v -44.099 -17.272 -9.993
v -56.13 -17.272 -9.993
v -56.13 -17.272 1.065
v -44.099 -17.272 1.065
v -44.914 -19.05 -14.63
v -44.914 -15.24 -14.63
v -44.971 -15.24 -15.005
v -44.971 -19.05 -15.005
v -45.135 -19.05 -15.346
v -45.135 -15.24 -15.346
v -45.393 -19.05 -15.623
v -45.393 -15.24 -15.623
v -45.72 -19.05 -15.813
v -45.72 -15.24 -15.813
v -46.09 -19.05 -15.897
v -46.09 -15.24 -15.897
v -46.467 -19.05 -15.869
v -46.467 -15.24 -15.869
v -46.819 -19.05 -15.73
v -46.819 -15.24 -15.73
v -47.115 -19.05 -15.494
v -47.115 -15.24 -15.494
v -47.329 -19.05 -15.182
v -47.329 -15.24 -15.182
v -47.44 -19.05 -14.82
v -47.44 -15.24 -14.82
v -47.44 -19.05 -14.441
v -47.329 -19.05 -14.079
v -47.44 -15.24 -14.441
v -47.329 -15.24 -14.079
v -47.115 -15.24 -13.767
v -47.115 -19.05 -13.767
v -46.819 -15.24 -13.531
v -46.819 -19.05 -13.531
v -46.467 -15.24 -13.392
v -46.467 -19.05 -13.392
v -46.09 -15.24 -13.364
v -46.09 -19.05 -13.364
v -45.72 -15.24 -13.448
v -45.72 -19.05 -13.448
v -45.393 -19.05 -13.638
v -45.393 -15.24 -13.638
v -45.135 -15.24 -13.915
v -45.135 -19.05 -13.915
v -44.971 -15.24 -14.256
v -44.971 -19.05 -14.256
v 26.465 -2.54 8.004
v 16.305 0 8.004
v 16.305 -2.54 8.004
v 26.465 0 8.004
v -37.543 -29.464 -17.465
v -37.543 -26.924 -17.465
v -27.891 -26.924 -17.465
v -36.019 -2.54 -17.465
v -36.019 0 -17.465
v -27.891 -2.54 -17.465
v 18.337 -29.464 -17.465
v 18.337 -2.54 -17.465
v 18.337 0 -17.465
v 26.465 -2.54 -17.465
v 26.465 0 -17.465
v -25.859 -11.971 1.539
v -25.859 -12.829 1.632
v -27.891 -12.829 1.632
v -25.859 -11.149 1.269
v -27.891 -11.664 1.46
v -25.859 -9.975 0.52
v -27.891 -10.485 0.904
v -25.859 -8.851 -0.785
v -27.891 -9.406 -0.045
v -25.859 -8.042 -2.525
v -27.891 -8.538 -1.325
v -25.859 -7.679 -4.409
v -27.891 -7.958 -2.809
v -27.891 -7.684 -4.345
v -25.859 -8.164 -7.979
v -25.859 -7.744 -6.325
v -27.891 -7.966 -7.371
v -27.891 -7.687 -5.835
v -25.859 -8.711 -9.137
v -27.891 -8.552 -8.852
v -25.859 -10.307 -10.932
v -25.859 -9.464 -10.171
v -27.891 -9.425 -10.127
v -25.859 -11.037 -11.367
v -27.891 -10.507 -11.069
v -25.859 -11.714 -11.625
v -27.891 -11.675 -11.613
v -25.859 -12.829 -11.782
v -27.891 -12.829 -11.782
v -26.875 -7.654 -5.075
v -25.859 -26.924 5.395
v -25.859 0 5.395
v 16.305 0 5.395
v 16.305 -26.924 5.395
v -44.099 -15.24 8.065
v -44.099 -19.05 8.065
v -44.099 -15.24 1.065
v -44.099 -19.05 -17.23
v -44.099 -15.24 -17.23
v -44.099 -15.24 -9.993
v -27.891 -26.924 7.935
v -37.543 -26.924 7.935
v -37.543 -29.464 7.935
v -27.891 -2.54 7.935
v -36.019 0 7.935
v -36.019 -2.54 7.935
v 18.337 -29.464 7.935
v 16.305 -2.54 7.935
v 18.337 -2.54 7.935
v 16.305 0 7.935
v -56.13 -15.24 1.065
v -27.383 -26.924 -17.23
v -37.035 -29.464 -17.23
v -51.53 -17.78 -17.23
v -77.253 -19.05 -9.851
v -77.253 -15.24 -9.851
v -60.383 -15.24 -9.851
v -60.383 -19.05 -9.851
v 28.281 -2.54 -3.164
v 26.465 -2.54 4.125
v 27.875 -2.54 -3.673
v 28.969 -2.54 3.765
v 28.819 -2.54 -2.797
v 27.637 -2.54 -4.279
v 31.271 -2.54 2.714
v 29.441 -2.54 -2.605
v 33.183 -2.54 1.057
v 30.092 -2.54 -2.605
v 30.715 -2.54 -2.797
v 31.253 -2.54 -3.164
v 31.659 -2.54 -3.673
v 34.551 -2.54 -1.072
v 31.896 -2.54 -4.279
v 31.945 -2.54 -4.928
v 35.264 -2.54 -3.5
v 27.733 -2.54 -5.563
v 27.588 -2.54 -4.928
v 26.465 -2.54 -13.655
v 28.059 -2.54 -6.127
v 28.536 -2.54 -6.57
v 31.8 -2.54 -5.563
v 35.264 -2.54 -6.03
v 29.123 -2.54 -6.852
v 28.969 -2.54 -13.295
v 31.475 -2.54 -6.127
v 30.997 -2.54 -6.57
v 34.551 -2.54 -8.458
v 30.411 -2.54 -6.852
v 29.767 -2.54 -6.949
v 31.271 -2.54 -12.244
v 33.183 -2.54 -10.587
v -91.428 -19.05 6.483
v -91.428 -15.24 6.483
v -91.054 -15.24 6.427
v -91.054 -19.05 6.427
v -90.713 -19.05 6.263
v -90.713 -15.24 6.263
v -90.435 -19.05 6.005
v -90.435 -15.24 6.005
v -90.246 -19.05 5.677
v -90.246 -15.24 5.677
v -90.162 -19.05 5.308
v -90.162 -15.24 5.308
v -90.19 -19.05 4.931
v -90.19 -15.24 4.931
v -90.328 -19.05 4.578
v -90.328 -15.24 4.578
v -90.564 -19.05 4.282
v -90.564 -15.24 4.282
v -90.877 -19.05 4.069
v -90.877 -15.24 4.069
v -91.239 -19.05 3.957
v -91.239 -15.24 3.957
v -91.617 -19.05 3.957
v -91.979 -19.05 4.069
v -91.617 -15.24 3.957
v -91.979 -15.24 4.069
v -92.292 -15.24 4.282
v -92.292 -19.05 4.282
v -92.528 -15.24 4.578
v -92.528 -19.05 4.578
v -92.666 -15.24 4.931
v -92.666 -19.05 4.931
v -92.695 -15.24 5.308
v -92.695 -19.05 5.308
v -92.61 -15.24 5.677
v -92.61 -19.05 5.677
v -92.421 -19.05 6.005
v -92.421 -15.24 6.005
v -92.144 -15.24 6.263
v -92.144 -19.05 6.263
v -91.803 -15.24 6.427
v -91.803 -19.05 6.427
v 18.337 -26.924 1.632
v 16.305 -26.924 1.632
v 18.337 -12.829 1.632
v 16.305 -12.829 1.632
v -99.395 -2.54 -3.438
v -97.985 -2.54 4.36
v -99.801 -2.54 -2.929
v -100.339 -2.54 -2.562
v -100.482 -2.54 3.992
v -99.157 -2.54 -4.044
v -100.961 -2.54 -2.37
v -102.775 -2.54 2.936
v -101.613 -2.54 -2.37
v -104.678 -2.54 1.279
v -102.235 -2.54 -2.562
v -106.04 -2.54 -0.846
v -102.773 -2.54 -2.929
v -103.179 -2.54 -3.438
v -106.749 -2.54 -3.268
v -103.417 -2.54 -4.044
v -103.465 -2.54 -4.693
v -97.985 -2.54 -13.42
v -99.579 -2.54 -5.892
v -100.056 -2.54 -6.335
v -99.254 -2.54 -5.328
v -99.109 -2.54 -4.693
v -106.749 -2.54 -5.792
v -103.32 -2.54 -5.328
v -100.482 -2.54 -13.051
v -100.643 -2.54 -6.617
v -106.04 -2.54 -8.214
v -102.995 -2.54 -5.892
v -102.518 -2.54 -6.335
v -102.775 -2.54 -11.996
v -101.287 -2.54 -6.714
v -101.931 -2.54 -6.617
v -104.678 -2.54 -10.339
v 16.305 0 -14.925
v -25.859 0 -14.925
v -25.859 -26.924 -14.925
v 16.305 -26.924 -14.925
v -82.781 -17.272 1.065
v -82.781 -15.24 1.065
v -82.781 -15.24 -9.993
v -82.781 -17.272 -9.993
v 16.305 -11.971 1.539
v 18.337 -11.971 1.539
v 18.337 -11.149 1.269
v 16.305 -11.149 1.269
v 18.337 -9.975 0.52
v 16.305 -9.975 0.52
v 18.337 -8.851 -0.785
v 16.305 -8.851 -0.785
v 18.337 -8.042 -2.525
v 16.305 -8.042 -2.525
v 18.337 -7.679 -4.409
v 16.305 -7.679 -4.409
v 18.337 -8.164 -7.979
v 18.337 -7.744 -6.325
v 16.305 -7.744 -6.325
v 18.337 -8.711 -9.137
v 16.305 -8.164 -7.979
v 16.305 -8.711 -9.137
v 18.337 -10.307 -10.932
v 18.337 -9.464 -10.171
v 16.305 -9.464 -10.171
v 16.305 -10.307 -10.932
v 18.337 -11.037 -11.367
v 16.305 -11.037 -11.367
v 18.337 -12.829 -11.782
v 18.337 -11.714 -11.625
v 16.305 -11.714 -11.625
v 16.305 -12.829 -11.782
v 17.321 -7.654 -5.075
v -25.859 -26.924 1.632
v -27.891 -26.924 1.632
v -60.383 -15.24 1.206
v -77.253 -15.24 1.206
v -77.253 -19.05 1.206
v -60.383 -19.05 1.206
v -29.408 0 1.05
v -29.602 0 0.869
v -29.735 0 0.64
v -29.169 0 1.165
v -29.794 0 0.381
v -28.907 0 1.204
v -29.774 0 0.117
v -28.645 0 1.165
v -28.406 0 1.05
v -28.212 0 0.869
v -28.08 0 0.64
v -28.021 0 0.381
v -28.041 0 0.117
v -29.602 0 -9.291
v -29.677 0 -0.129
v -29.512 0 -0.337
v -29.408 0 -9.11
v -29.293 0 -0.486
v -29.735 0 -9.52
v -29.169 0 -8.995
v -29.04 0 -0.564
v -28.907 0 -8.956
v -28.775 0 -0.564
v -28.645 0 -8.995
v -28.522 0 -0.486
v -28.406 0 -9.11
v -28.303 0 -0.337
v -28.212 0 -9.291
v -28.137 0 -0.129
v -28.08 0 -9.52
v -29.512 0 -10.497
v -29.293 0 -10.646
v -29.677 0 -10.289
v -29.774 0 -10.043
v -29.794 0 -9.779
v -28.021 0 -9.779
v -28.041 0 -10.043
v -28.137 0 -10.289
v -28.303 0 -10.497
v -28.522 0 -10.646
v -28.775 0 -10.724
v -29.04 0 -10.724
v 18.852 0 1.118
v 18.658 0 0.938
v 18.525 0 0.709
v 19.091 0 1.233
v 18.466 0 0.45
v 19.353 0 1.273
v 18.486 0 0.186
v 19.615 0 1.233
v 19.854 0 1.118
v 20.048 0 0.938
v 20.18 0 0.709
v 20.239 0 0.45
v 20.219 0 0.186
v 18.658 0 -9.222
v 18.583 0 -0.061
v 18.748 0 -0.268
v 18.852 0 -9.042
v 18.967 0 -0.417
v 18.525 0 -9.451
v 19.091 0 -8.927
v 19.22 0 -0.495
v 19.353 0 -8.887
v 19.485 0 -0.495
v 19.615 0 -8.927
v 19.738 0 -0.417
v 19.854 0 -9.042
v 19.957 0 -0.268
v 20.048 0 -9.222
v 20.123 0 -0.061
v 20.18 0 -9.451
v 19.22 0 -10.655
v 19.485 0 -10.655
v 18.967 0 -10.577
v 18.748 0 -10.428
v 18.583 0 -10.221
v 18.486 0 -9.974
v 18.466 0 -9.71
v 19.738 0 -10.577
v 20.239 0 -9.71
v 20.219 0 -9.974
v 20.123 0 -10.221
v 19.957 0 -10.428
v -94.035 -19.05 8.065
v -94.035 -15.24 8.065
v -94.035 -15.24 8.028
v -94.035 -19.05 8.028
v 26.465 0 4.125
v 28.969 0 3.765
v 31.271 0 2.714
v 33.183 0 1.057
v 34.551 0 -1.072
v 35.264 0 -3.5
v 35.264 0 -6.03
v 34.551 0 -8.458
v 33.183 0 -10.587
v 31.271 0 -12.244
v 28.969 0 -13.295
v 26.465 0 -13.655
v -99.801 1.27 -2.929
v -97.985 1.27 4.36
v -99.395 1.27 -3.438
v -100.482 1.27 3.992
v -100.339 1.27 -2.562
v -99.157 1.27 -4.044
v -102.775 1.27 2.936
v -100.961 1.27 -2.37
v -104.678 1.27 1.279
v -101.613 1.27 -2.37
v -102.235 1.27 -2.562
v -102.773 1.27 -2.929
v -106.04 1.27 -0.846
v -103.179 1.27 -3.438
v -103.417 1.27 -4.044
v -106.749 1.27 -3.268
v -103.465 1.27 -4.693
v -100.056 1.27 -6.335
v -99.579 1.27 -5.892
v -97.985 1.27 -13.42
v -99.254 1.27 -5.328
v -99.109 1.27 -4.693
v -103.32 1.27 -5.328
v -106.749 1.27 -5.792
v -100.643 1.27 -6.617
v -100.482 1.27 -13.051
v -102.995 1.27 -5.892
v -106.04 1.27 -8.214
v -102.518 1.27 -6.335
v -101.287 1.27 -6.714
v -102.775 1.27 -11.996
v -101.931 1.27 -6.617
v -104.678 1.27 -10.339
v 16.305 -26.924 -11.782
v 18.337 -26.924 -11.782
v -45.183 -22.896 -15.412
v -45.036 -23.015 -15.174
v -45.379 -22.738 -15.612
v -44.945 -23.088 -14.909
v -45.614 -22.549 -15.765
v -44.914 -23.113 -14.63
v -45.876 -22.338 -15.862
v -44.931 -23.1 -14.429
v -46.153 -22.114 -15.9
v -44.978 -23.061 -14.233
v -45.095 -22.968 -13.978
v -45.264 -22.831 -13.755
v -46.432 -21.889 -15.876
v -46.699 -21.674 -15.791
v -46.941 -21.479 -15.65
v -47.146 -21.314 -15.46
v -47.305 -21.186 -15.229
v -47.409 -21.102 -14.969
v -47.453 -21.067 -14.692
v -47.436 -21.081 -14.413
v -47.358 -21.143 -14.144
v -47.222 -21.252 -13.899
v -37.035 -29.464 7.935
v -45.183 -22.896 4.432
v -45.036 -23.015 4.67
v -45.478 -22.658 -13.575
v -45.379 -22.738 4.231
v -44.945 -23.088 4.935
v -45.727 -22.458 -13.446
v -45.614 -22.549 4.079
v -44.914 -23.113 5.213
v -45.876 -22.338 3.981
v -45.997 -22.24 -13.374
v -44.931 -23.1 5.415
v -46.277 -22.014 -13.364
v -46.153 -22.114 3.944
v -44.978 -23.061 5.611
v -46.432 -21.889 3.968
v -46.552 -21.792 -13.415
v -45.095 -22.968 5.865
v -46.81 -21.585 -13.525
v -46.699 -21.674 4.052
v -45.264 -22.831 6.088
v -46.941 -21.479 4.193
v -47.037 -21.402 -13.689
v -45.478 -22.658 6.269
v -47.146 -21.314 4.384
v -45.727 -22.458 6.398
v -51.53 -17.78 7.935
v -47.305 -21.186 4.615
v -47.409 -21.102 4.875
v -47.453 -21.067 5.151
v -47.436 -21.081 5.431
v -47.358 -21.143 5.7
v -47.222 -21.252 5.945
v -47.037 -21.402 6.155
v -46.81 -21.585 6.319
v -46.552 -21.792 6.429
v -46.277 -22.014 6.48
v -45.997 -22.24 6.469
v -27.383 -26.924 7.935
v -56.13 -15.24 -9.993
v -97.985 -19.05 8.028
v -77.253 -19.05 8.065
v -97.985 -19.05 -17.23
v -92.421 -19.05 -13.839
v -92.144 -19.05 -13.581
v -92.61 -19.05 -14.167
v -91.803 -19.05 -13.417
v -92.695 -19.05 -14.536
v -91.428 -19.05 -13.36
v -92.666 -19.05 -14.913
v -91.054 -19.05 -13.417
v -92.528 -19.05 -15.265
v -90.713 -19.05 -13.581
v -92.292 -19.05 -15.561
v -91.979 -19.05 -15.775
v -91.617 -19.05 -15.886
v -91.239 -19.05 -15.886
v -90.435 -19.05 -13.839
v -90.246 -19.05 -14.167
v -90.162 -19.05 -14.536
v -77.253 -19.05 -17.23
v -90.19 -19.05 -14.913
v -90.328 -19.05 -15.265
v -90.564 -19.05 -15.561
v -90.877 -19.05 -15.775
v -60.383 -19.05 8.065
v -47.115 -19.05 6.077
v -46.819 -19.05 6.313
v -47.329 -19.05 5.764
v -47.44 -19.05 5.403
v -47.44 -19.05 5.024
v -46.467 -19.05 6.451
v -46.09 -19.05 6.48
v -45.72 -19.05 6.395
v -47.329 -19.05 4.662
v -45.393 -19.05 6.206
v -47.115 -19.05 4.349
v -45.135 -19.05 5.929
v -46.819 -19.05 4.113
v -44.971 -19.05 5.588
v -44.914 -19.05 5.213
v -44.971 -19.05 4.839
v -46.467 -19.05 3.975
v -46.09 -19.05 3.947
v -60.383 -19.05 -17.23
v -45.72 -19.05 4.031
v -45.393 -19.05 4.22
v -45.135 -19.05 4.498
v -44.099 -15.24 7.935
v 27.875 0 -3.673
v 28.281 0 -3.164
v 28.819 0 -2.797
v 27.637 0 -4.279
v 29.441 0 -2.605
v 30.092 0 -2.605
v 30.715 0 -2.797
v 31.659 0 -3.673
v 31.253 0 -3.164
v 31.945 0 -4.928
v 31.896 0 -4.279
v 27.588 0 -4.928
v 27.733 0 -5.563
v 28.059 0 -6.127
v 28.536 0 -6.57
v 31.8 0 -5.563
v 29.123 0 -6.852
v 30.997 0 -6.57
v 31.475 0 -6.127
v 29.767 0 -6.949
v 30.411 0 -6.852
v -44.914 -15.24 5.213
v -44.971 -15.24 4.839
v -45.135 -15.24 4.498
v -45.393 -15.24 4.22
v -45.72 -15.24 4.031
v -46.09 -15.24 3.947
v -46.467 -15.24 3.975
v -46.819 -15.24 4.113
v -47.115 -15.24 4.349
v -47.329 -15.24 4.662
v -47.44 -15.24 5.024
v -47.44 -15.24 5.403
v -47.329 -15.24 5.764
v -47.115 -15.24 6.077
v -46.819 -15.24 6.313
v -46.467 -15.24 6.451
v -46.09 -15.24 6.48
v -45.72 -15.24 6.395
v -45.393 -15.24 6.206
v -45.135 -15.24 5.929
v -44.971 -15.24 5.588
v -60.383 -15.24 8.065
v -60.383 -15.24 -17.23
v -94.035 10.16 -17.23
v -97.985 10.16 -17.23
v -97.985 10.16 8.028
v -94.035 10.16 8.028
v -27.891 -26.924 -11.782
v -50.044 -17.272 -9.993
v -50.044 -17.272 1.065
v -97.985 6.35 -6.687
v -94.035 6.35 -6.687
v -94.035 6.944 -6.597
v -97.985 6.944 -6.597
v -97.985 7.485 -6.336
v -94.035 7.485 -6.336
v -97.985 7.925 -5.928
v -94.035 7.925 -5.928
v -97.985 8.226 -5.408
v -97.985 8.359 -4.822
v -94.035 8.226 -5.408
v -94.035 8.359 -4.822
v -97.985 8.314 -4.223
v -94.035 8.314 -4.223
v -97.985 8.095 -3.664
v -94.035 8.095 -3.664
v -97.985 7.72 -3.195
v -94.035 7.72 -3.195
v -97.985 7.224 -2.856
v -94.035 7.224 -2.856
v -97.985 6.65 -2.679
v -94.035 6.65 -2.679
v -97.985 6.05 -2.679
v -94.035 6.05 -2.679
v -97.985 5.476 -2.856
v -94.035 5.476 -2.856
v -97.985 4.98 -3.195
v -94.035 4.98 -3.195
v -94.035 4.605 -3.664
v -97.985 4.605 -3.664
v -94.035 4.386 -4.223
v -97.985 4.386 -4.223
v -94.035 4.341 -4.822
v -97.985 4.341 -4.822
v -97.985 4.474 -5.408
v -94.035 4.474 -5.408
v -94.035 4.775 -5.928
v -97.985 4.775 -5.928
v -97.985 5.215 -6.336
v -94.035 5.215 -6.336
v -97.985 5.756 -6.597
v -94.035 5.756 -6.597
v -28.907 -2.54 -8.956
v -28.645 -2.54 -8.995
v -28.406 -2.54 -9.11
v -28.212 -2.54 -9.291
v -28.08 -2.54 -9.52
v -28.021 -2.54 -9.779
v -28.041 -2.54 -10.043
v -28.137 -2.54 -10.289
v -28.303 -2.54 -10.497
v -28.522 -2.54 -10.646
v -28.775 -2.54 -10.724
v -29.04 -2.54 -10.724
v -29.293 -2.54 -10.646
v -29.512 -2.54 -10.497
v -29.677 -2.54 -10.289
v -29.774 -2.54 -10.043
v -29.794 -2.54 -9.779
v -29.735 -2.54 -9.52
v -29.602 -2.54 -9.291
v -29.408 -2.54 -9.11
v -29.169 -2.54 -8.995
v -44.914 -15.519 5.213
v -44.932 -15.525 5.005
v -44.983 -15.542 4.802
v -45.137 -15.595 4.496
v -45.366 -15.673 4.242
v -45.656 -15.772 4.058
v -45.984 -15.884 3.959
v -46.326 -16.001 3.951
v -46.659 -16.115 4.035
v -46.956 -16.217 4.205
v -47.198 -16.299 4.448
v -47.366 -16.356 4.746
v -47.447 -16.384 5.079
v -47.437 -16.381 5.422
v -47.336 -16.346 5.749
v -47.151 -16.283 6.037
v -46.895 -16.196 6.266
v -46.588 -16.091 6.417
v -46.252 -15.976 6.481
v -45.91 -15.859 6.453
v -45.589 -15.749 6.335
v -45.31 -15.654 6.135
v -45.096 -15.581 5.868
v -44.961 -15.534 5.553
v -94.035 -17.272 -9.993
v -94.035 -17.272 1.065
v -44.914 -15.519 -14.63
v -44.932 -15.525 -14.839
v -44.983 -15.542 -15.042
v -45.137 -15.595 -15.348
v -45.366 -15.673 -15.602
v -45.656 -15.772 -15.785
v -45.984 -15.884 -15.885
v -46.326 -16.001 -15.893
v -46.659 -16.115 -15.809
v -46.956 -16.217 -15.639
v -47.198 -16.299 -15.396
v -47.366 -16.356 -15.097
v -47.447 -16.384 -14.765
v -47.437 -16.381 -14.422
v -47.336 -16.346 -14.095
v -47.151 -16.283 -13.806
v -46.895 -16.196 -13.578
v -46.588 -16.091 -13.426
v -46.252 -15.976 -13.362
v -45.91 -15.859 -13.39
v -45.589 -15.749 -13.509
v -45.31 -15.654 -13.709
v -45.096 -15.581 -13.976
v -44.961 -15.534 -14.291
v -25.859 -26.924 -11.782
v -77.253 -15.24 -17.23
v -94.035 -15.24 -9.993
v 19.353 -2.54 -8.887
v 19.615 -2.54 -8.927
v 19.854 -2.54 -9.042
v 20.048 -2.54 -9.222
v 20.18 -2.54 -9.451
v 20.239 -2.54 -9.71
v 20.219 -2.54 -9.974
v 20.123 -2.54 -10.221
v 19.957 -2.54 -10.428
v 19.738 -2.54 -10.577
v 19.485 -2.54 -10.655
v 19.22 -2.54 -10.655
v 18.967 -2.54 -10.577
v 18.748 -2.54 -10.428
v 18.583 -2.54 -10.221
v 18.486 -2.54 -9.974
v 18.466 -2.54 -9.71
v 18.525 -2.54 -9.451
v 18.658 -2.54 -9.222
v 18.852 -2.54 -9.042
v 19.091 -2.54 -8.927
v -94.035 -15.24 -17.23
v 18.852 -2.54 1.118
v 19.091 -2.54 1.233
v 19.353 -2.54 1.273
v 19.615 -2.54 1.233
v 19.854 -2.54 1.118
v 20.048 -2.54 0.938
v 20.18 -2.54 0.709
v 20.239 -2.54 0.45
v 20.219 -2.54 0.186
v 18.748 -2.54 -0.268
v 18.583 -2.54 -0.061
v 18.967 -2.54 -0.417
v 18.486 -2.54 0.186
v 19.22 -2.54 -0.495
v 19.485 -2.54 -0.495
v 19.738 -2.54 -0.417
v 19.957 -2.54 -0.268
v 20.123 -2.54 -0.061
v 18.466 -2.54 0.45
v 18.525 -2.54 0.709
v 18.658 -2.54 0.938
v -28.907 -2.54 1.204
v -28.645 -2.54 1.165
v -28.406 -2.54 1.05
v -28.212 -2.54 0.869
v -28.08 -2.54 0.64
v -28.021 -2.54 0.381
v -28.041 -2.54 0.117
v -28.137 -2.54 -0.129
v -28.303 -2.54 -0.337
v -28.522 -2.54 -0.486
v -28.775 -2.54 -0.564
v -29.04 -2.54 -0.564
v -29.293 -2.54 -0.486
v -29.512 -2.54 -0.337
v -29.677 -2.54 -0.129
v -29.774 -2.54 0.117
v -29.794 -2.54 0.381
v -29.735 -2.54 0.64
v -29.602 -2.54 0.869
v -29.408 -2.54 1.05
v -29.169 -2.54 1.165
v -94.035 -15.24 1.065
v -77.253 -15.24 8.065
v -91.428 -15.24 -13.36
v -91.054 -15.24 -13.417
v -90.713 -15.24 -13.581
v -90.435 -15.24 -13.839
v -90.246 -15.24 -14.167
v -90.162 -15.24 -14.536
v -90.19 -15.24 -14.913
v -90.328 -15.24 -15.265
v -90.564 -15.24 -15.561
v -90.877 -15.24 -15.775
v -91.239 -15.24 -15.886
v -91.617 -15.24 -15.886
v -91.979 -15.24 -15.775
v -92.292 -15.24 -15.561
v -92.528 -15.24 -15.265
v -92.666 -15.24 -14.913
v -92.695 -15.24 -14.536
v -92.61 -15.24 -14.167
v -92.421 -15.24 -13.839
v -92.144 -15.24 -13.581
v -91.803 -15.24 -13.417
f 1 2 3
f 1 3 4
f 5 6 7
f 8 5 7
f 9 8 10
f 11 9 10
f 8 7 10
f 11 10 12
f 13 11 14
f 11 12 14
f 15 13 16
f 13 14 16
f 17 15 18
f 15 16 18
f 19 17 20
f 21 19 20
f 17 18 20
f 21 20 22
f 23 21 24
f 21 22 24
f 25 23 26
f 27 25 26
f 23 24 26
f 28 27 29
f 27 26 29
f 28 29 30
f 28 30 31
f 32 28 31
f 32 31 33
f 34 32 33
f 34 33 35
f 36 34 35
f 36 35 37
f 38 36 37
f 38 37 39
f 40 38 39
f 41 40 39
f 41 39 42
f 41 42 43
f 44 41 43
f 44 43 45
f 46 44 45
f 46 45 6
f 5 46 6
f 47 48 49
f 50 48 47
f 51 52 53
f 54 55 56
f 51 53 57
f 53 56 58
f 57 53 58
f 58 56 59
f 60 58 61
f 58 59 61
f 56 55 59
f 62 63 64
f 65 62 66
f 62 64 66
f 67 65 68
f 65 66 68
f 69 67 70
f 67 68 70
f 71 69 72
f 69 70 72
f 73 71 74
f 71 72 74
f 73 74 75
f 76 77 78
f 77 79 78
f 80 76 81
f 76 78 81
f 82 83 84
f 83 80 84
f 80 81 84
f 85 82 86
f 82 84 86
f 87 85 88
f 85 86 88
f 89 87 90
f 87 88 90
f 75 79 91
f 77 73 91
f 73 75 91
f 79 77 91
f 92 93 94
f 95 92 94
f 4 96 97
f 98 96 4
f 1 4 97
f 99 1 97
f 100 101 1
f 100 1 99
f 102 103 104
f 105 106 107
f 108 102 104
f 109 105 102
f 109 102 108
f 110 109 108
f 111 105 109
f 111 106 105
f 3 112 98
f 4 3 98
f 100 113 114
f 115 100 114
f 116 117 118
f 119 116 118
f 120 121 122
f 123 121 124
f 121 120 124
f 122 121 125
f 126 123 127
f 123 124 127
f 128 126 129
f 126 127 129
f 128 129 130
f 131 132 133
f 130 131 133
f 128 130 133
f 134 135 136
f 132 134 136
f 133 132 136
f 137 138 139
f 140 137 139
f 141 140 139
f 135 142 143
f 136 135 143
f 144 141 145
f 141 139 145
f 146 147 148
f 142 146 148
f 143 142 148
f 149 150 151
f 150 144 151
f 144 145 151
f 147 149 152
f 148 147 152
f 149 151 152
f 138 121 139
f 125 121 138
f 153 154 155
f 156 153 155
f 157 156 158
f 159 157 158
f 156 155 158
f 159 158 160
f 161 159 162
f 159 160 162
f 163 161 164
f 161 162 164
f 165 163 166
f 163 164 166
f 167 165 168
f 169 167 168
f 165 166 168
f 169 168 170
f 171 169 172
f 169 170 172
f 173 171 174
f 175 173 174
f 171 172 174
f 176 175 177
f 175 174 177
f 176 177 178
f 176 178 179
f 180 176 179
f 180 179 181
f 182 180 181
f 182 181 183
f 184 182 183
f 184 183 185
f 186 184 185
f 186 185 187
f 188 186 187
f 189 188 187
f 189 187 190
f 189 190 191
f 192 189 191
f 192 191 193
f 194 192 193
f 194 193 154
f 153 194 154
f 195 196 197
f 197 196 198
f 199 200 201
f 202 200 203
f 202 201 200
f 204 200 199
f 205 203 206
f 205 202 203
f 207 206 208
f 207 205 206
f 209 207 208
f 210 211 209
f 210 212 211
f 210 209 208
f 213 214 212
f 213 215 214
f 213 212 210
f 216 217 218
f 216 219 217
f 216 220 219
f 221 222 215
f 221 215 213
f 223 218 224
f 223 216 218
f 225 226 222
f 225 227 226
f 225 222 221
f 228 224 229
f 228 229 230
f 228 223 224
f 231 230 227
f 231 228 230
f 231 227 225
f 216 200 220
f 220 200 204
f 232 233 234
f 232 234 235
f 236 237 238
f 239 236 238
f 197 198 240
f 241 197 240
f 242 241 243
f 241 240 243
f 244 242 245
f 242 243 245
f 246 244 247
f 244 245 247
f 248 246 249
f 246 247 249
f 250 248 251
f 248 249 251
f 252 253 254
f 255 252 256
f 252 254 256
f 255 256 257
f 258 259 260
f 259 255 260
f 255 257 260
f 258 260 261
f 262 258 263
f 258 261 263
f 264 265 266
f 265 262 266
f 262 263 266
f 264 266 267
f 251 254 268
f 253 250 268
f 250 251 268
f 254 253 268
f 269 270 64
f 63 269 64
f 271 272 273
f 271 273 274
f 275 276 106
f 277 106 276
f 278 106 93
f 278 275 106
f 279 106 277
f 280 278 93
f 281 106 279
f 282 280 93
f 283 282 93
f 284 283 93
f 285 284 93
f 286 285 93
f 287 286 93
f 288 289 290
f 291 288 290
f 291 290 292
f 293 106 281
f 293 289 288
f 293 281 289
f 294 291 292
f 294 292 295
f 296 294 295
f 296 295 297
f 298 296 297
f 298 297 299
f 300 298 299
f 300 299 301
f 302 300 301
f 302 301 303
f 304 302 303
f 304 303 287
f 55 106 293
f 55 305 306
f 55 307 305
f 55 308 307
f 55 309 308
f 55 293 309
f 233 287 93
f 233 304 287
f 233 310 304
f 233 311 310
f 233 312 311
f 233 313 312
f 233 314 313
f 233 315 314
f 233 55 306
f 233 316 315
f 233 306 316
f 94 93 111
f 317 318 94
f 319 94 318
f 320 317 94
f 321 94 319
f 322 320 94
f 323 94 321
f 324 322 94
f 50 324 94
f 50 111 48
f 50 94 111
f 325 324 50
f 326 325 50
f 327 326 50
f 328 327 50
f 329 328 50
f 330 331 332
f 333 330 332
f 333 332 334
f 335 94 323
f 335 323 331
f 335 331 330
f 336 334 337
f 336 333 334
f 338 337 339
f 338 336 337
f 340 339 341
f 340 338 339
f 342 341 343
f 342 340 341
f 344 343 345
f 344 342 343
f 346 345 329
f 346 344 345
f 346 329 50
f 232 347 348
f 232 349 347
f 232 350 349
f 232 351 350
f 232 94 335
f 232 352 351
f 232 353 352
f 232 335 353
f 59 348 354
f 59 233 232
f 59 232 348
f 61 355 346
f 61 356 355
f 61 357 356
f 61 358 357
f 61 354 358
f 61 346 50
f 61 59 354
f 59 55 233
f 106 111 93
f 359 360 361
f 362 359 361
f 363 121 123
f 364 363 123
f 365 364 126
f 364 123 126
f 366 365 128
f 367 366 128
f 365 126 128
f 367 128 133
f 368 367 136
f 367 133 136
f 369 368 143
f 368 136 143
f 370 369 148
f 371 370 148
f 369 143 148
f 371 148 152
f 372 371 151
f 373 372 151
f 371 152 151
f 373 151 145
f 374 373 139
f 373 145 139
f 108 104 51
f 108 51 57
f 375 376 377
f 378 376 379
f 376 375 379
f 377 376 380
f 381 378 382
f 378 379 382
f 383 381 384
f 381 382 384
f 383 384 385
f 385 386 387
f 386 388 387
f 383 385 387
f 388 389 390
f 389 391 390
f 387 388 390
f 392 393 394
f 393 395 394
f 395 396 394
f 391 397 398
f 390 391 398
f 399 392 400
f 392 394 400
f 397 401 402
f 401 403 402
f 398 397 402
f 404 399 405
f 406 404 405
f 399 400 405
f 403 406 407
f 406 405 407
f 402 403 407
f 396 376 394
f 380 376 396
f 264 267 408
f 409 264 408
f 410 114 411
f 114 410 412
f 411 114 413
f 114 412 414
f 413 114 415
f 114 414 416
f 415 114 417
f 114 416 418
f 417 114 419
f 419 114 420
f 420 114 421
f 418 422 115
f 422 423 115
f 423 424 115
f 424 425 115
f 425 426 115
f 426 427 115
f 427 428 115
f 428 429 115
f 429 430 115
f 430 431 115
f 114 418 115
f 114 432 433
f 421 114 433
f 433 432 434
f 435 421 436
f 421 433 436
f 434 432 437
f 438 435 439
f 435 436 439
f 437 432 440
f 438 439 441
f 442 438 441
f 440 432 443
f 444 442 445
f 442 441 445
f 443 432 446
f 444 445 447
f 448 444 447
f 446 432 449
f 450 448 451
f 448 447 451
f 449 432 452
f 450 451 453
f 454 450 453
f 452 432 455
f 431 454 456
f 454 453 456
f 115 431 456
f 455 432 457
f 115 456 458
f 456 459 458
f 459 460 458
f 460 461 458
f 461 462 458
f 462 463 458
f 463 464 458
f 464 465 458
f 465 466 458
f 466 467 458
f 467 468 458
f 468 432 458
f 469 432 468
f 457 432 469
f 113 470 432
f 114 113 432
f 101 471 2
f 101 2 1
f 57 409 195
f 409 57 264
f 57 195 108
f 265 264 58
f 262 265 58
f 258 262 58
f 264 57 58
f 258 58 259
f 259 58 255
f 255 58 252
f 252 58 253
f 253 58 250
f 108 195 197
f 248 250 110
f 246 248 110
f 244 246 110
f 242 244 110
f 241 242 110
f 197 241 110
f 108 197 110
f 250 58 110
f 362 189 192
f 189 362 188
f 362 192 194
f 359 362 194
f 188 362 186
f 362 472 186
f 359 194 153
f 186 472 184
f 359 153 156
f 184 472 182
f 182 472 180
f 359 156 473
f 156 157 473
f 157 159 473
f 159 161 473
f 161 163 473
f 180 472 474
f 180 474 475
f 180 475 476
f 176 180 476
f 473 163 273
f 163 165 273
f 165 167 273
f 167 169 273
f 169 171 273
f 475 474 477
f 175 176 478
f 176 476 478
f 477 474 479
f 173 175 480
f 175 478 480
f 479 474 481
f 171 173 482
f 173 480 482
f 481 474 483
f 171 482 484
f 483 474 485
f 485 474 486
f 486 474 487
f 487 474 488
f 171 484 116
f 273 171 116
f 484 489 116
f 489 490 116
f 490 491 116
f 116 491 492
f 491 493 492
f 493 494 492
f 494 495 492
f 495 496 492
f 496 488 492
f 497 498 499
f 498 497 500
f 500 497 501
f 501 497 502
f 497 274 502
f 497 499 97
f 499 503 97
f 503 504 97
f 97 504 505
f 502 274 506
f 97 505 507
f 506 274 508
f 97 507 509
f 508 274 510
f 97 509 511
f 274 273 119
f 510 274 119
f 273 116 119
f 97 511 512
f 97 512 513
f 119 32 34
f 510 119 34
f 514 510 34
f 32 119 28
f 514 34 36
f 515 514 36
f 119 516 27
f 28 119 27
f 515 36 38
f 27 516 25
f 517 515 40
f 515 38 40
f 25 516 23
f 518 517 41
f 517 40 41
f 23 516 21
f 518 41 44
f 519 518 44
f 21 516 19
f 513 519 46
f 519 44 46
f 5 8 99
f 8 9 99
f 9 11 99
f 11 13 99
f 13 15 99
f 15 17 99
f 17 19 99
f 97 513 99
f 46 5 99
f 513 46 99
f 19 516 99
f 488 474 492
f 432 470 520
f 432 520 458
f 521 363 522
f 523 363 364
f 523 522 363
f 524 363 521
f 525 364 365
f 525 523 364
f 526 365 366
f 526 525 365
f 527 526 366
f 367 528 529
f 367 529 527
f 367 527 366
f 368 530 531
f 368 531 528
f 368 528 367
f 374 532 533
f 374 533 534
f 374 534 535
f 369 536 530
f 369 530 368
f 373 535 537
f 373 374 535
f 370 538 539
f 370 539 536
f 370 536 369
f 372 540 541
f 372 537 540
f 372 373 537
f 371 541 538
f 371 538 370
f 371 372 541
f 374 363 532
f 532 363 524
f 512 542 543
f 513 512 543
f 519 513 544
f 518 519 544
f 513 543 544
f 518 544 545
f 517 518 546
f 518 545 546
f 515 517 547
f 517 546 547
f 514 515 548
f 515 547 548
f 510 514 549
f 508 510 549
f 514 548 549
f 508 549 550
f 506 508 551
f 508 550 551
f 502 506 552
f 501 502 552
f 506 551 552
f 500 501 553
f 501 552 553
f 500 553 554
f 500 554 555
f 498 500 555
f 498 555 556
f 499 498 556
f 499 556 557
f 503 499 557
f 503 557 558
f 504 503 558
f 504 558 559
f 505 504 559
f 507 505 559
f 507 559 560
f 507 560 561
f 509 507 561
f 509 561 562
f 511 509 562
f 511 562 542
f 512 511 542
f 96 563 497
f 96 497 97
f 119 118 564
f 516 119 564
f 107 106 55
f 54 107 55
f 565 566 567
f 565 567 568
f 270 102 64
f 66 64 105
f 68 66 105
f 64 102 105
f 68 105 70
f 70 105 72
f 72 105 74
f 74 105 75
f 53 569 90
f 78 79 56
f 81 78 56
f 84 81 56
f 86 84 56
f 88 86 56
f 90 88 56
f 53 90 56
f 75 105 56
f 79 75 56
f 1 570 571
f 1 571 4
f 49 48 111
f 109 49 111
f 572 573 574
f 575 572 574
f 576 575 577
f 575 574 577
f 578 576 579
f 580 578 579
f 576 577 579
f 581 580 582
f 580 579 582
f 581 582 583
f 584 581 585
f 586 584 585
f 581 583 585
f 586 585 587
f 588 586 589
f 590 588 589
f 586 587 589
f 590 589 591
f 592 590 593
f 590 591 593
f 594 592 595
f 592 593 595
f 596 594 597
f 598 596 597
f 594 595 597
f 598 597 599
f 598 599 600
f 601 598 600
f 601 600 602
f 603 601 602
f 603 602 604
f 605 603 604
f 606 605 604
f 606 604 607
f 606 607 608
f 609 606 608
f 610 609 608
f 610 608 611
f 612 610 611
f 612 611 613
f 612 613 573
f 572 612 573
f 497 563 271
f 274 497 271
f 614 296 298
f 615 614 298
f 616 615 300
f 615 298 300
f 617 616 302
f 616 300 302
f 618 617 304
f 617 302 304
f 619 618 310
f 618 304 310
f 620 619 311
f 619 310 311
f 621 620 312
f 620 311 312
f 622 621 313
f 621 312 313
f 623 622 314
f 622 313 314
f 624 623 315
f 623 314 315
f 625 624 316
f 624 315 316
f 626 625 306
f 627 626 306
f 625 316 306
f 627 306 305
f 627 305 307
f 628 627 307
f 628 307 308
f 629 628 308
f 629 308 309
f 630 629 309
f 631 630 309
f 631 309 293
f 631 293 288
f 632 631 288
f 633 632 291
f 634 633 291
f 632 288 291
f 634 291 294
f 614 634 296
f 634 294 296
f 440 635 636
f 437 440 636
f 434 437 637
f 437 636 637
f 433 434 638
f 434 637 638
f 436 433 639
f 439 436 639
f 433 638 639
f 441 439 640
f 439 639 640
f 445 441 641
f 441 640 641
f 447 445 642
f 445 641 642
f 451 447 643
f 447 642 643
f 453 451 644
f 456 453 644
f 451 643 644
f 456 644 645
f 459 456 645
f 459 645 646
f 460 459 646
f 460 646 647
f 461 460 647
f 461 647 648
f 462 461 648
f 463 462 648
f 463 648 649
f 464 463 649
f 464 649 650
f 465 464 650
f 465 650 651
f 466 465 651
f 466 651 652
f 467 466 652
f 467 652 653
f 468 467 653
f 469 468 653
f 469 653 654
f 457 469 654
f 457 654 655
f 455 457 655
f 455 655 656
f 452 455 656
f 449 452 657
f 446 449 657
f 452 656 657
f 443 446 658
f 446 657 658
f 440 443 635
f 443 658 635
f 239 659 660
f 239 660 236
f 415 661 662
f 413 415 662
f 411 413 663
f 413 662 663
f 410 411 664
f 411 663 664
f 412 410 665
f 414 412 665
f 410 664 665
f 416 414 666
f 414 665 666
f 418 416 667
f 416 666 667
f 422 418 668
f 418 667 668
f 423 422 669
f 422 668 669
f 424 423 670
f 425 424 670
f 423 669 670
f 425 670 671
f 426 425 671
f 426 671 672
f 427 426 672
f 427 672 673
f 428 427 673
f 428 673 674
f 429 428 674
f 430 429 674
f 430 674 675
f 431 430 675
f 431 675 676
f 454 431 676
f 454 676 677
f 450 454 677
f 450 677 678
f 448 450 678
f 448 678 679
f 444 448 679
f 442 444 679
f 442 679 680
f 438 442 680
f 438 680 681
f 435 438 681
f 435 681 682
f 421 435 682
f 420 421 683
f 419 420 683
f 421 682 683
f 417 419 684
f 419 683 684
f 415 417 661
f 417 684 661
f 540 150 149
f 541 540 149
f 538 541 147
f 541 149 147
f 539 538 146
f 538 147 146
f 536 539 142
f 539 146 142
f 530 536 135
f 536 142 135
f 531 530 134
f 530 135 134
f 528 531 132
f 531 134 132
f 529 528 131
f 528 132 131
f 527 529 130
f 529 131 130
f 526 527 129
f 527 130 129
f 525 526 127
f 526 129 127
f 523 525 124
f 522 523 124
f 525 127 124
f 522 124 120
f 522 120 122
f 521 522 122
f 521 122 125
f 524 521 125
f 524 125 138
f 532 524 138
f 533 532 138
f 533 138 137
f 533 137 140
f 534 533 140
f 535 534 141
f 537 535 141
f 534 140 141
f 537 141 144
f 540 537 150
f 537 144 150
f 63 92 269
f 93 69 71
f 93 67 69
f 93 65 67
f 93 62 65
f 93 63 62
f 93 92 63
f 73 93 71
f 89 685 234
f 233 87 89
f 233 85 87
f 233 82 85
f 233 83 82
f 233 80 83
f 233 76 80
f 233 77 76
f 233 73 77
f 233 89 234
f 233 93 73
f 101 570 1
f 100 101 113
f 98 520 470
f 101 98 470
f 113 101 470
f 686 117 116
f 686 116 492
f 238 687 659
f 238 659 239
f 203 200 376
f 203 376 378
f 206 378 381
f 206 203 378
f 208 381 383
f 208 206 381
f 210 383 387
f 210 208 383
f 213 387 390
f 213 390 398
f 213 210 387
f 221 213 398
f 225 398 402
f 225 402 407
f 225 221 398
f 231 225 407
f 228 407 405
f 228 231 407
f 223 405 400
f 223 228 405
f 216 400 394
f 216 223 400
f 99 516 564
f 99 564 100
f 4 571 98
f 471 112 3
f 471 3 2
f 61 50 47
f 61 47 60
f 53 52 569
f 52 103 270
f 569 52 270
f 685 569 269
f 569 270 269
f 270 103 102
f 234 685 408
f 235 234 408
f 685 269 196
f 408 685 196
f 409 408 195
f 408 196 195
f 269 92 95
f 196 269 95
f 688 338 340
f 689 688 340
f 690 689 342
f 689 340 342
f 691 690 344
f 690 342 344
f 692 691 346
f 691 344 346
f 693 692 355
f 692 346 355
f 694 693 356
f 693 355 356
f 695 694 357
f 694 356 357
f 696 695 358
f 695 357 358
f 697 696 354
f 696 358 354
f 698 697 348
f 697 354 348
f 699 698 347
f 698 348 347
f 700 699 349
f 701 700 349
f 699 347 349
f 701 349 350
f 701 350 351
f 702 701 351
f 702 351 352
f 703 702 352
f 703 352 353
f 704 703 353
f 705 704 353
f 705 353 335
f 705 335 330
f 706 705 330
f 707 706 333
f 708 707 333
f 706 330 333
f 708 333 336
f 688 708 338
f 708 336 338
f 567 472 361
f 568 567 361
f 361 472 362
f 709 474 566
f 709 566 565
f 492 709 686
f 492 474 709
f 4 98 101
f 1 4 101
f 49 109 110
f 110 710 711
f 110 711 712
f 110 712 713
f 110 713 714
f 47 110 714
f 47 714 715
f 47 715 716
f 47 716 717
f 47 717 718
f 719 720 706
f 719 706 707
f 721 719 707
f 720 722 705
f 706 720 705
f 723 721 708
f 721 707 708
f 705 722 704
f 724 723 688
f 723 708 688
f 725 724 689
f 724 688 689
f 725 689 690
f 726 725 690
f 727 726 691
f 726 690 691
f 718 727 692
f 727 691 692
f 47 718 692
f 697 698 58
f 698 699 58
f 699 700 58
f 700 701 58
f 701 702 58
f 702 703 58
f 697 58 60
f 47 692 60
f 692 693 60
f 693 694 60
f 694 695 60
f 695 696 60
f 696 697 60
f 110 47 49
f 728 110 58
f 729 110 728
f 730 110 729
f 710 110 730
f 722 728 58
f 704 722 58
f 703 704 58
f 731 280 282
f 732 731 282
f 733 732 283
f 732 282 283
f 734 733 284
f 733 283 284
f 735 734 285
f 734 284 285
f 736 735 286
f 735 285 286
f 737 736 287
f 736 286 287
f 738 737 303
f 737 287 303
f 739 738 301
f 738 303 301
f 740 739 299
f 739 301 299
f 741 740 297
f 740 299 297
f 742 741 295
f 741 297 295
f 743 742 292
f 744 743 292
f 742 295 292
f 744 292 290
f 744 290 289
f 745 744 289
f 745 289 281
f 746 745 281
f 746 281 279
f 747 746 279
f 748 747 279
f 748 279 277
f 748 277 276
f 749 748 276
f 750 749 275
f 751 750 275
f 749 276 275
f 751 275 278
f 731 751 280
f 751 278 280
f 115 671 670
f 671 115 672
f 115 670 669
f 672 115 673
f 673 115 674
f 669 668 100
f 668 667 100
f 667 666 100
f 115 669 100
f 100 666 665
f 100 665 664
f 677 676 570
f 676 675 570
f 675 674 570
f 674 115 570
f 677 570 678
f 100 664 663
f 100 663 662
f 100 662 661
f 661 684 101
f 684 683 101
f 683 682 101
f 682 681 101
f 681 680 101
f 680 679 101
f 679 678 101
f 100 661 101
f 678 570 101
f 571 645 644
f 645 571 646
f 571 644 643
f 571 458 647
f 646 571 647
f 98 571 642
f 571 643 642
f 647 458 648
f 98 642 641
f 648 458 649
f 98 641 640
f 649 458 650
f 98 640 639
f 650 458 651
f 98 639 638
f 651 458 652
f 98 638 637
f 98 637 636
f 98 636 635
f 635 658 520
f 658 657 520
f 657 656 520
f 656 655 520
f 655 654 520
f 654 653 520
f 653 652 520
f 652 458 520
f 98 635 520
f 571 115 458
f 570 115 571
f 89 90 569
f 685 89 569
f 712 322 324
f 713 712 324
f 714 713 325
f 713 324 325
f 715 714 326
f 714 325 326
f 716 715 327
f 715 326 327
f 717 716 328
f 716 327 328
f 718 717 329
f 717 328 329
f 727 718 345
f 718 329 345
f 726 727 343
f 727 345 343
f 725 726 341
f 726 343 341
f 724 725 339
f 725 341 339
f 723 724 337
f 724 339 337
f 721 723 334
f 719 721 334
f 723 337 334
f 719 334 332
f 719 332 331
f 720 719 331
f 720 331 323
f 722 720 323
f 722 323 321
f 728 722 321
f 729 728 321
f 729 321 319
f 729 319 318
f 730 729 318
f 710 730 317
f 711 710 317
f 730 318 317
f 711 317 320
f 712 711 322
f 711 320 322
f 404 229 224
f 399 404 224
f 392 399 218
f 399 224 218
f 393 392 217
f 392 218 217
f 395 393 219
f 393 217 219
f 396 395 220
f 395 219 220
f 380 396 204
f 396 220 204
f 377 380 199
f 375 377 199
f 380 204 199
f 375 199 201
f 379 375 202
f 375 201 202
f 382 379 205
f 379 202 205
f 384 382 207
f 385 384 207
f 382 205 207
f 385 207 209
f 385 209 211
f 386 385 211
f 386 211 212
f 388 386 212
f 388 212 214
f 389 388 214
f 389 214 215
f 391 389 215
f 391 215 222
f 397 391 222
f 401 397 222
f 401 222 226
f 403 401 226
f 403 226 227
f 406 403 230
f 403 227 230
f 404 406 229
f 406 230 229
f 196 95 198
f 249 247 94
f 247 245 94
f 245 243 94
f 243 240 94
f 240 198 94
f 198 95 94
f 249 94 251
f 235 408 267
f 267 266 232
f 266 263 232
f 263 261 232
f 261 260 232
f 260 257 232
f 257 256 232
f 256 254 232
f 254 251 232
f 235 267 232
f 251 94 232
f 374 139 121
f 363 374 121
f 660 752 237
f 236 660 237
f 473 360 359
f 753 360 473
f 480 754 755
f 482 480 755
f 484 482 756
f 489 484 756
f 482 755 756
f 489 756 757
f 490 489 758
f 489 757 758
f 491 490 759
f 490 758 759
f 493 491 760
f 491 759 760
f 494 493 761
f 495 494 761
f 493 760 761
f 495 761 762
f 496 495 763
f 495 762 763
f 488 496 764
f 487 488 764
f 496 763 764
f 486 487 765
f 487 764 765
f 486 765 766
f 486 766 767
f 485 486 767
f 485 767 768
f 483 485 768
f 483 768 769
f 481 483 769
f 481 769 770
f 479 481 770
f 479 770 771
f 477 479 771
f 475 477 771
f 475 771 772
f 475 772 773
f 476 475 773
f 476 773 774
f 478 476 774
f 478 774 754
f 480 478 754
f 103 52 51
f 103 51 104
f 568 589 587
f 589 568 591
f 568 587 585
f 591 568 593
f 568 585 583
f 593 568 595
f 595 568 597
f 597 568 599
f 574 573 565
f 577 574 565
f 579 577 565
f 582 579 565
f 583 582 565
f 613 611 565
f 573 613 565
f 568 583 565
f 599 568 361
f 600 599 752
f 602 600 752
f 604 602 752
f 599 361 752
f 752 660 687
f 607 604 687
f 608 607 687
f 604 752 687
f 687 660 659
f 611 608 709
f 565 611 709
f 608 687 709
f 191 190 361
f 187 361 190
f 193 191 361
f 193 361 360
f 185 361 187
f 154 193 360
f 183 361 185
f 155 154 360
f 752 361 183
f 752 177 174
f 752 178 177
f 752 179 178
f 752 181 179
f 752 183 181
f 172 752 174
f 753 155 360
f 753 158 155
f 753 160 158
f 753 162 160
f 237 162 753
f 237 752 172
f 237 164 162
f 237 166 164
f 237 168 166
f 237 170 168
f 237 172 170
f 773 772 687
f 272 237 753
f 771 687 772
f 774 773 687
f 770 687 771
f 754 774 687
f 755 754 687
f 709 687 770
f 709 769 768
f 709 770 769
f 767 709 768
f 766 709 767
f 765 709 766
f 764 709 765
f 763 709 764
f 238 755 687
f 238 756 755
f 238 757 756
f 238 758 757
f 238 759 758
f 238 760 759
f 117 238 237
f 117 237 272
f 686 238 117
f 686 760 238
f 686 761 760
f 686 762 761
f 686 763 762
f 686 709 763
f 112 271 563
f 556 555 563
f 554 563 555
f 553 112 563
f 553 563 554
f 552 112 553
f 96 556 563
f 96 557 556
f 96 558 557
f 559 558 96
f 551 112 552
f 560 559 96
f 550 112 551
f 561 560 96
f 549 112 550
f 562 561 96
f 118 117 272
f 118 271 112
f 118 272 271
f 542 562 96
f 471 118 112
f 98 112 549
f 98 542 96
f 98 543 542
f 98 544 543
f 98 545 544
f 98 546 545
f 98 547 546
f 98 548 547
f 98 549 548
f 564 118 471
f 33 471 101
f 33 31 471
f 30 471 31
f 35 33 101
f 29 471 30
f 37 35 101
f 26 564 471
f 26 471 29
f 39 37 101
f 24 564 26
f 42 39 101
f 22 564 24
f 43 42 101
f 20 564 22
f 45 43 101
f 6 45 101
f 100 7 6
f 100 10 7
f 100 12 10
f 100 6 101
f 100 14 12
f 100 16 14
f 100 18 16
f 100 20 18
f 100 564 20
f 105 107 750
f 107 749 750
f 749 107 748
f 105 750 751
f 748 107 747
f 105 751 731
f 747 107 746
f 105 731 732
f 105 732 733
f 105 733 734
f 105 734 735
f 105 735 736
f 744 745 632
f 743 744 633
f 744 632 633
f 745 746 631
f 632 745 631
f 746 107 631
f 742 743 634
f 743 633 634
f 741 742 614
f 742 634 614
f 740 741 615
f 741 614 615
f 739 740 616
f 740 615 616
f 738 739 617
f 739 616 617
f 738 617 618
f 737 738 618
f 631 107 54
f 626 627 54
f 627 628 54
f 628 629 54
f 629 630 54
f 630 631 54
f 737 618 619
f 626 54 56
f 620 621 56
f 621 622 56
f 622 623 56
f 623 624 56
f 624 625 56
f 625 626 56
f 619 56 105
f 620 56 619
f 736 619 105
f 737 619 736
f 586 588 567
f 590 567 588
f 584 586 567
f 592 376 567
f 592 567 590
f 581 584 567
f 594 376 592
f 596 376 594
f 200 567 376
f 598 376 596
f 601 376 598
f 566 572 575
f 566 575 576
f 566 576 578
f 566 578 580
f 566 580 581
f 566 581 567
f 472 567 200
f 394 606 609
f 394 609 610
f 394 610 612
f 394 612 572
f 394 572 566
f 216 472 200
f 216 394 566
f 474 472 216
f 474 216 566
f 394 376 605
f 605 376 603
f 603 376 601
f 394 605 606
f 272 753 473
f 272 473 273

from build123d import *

# Parameters (mm, degrees)
SKETCH2_W                = 46.228
SKETCH2_H                = 25.4
SKETCH2_W_2              = 42.164
SKETCH2_H_2              = 20.32
BOSS_EXTRUDE1_DEPTH      = 26.924
CUT_EXTRUDE2_DEPTH       = 57.27570692
SKETCH7_W                = 10.16
SKETCH7_H                = 25.468917493
SKETCH7_R                = 0.889
SKETCH7_H_2              = 25.4
BOSS_EXTRUDE2_DEPTH      = 2.54
SKETCH8_W                = 55.88
SKETCH8_H                = 25.4
BOSS_EXTRUDE3_DEPTH      = 2.54
SKETCH9_W                = 49.9364
SKETCH9_H                = 25.295126645
BOSS_EXTRUDE4_DEPTH      = 3.81
BOSS_EXTRUDE6_DEPTH      = 25.164887468
SKETCH13_R               = 1.27
SKETCH13_R_2             = 1.269999999
CUT_EXTRUDE3_DEPTH       = 97.850165524
BOSS_EXTRUDE7_DEPTH      = 25.4
BOSS_EXTRUDE7_DEPTH_BACK = 3.81
SKETCH14_W               = 3.949525569
SKETCH14_H               = 25.258159439
SKETCH15_R               = 2.014878308
CUT_EXTRUDE4_DEPTH       = 25.4
SKETCH16_W               = 16.869515363
SKETCH16_H               = 7.378931384
SKETCH16_H_2             = 6.858865863
CUT_EXTRUDE5_DEPTH       = 25.4
SKETCH17_W               = 12.031127212
SKETCH17_H               = 11.057329398
SKETCH17_W_2             = 11.254273727
CUT_EXTRUDE6_DEPTH       = 2.032
SKETCH18_R               = 2.1844
BOSS_EXTRUDE8_DEPTH      = 3.81
SKETCH19_R               = 2.1844
BOSS_EXTRUDE9_DEPTH      = 2.54


with BuildPart() as part:
    # Sketch2 → Boss-Extrude1 (new body)
    with BuildSketch(Plane(origin=(0, 0, 0), x_dir=(1, 0, 0), z_dir=(0, 1, 0))):
        with Locations((-4.777236152, 4.764977222)):
            Rectangle(SKETCH2_W, SKETCH2_H)
        with Locations((-4.777236152, 4.764977222)):
            Rectangle(SKETCH2_W_2, SKETCH2_H_2, mode=Mode.SUBTRACT)
    extrude(amount=-BOSS_EXTRUDE1_DEPTH)

    # Sketch6 → Cut-Extrude2 (cut, through all)
    with BuildSketch(Plane.ZY.offset(27.891236152)):
        with BuildLine():
            Line((-11.782176259, -26.924), (1.631916928, -26.924))
            Line((1.631916928, -26.924), (1.631916928, -12.829472687))
            add(Edge.make_bspline(
                [(1.631916928, -12.829472687), (1.631916928, -7.653676396), (-5.075129666, -7.653676396), (-11.782176259, -7.653676396), (-11.782176259, -12.829472687)],
                knots=[3.141592654, 3.141592654, 3.141592654, 4.71238898, 4.71238898, 6.283185307, 6.283185307, 6.283185307], degree=2, weights=[1, 0.707106781, 1, 0.707106781, 1]))
            Line((-11.782176259, -12.829472687), (-11.782176259, -26.924))
        make_face()
    extrude(amount=-CUT_EXTRUDE2_DEPTH, mode=Mode.SUBTRACT)

    # Sketch7 → Boss-Extrude2 (add)
    # profile 1 of 2: a face of its own
    with BuildSketch(Plane(origin=(0, 0, 0), x_dir=(1, 0, 0), z_dir=(0, 1, 0))):
        with Locations((21.384763848, 4.730518476)):
            Rectangle(SKETCH7_W, SKETCH7_H)
        with Locations(Location((19.352763848, 9.776059729, 0), (0, 0, 270))):
            Circle(SKETCH7_R, mode=Mode.SUBTRACT)
        with Locations(Location((19.352763848, -0.383940271, 0), (0, 0, 270))):
            Circle(SKETCH7_R, mode=Mode.SUBTRACT)
    # profile 2 of 2: a face of its own
    with BuildSketch(Plane(origin=(0, 0, 0), x_dir=(1, 0, 0), z_dir=(0, 1, 0))):
        with Locations((-30.939236152, 4.764977222)):
            Rectangle(SKETCH7_W, SKETCH7_H_2)
        with Locations(Location((-28.907236152, -0.315022778, 0), (0, 0, 270))):
            Circle(SKETCH7_R, mode=Mode.SUBTRACT)
        with Locations(Location((-28.907236152, 9.844977222, 0), (0, 0, 270))):
            Circle(SKETCH7_R, mode=Mode.SUBTRACT)
    extrude(amount=-BOSS_EXTRUDE2_DEPTH)

    # Sketch8 → Boss-Extrude3 (add)
    with BuildSketch(Plane.XZ.offset(26.924)):
        with Locations((-9.603236152, -4.764977222)):
            Rectangle(SKETCH8_W, SKETCH8_H)
    extrude(amount=BOSS_EXTRUDE3_DEPTH)


with BuildPart() as body_2:
    # Sketch9 → Boss-Extrude4 (new body)
    with BuildSketch(Plane(origin=(0, -15.24, 0), x_dir=(1, 0, 0), z_dir=(0, 1, 0))):
        with Locations((-69.067280145, 4.582301368)):
            Rectangle(SKETCH9_W, SKETCH9_H)
    extrude(amount=-BOSS_EXTRUDE4_DEPTH)


with BuildPart() as body_3:
    # Sketch11 → Boss-Extrude6 (new body)
    with BuildSketch(Plane.XY.offset(7.935022778)):
        Polygon((-44.099080145, -15.24), (-27.383236152, -26.924), (-37.035236152, -29.464), (-51.530261874, -17.78), align=None)
    extrude(amount=-BOSS_EXTRUDE6_DEPTH)


with BuildPart() as cut_extrude3_tool:
    # Sketch13 → Cut-Extrude3 (new, through all)
    with BuildSketch(Plane(origin=(0, -15.24, 0), x_dir=(1, 0, 0), z_dir=(0, 1, 0))):
        with Locations(Location((-91.428192435, 14.630489934, 0), (0, 0, 270))):
            Circle(SKETCH13_R)
        with Locations((-46.184442435, -5.213260066)):
            Circle(SKETCH13_R)
        with Locations((-46.184442435, 14.630489934)):
            Circle(SKETCH13_R_2)
        with Locations(Location((-91.428192435, -5.213260066, 0), (0, 0, 270))):
            Circle(SKETCH13_R)
    extrude(amount=-CUT_EXTRUDE3_DEPTH)


with BuildPart() as body_2_1:
    add(body_2.part)

    # Cut-Extrude3: cut by cut_extrude3_tool
    add(cut_extrude3_tool.part, mode=Mode.SUBTRACT)

    # Sketch14 → Boss-Extrude7 (add, two sides: drawn at the far end of the back side and taken through both)
    with BuildSketch(Plane(origin=(0, -15.24, 0), x_dir=(1, 0, 0), z_dir=(0, 1, 0)).offset(-BOSS_EXTRUDE7_DEPTH_BACK)):
        with Locations((-96.01024293, 4.600784971)):
            Rectangle(SKETCH14_W, SKETCH14_H)
    extrude(amount=BOSS_EXTRUDE7_DEPTH + BOSS_EXTRUDE7_DEPTH_BACK)

    # Sketch15 → Cut-Extrude4 (cut)
    with BuildSketch(Plane(origin=(-94.035480145, 0, 0), x_dir=(0, 0, -1), z_dir=(1, 0, 0))):
        with Locations((4.671705252, 6.35)):
            Circle(SKETCH15_R)
    extrude(amount=-CUT_EXTRUDE4_DEPTH, mode=Mode.SUBTRACT)

    # Sketch16 → Cut-Extrude5 (cut)
    with BuildSketch(Plane(origin=(0, -15.24, 0), x_dir=(1, 0, 0), z_dir=(0, 1, 0))):
        with Locations((-68.817784038, 13.540398999)):
            Rectangle(SKETCH16_W, SKETCH16_H)
        with Locations((-68.817784038, -4.635829023)):
            Rectangle(SKETCH16_W, SKETCH16_H_2)
    extrude(amount=-CUT_EXTRUDE5_DEPTH, mode=Mode.SUBTRACT)


with BuildPart() as body_3_1:
    add(body_3.part)

    # Cut-Extrude3: cut by cut_extrude3_tool
    add(cut_extrude3_tool.part, mode=Mode.SUBTRACT)


with BuildPart() as cut_extrude6_tool:
    # Sketch17 → Cut-Extrude6 (new body)
    with BuildSketch(Plane(origin=(0, -15.24, 0), x_dir=(1, 0, 0), z_dir=(0, 1, 0))):
        with Locations((-50.114643751, 4.464029241)):
            Rectangle(SKETCH17_W, SKETCH17_H)
        with Locations((-88.408343282, 4.464029241)):
            Rectangle(SKETCH17_W_2, SKETCH17_H)
    extrude(amount=-CUT_EXTRUDE6_DEPTH)


with BuildPart() as body_2_2:
    add(body_2_1.part)

    # Cut-Extrude6: cut by cut_extrude6_tool
    add(cut_extrude6_tool.part, mode=Mode.SUBTRACT)

    # Sketch18 → Boss-Extrude8 (add)
    with BuildSketch(Plane(origin=(0, -2.54, 0), x_dir=(-1, 0, 0), z_dir=(0, -1, 0))):
        with BuildLine():
            Line((97.949078108, 13.419864691), (97.949078108, -4.360135309))
            ThreePointArc((97.949078108, -4.360135309), (106.839078108, 4.529864691), (97.949078108, 13.419864691))
        make_face()
        with Locations(Location((101.287005714, 4.529864691, 0), (0, 0, 90))):
            Circle(SKETCH18_R, mode=Mode.SUBTRACT)
    extrude(amount=-BOSS_EXTRUDE8_DEPTH)


with BuildPart() as body_3_2:
    add(body_3_1.part)

    # Cut-Extrude6: cut by cut_extrude6_tool
    add(cut_extrude6_tool.part, mode=Mode.SUBTRACT)


with BuildPart() as body_4:
    # Sketch19 → Boss-Extrude9 (new body)
    with BuildSketch(Plane(origin=(0, -2.54, 0), x_dir=(-1, 0, 0), z_dir=(0, -1, 0))):
        with BuildLine():
            Line((-26.464763848, 13.654977222), (-26.464763848, -4.125022778))
            ThreePointArc((-26.464763848, -4.125022778), (-35.354763848, 4.764977222), (-26.464763848, 13.654977222))
        make_face()
        with Locations(Location((-29.766763848, 4.764977222, 0), (0, 0, 90))):
            Circle(SKETCH19_R, mode=Mode.SUBTRACT)
    extrude(amount=-BOSS_EXTRUDE9_DEPTH)


solid = Compound([part.part, body_2_2.part, body_3_2.part, body_4.part])
